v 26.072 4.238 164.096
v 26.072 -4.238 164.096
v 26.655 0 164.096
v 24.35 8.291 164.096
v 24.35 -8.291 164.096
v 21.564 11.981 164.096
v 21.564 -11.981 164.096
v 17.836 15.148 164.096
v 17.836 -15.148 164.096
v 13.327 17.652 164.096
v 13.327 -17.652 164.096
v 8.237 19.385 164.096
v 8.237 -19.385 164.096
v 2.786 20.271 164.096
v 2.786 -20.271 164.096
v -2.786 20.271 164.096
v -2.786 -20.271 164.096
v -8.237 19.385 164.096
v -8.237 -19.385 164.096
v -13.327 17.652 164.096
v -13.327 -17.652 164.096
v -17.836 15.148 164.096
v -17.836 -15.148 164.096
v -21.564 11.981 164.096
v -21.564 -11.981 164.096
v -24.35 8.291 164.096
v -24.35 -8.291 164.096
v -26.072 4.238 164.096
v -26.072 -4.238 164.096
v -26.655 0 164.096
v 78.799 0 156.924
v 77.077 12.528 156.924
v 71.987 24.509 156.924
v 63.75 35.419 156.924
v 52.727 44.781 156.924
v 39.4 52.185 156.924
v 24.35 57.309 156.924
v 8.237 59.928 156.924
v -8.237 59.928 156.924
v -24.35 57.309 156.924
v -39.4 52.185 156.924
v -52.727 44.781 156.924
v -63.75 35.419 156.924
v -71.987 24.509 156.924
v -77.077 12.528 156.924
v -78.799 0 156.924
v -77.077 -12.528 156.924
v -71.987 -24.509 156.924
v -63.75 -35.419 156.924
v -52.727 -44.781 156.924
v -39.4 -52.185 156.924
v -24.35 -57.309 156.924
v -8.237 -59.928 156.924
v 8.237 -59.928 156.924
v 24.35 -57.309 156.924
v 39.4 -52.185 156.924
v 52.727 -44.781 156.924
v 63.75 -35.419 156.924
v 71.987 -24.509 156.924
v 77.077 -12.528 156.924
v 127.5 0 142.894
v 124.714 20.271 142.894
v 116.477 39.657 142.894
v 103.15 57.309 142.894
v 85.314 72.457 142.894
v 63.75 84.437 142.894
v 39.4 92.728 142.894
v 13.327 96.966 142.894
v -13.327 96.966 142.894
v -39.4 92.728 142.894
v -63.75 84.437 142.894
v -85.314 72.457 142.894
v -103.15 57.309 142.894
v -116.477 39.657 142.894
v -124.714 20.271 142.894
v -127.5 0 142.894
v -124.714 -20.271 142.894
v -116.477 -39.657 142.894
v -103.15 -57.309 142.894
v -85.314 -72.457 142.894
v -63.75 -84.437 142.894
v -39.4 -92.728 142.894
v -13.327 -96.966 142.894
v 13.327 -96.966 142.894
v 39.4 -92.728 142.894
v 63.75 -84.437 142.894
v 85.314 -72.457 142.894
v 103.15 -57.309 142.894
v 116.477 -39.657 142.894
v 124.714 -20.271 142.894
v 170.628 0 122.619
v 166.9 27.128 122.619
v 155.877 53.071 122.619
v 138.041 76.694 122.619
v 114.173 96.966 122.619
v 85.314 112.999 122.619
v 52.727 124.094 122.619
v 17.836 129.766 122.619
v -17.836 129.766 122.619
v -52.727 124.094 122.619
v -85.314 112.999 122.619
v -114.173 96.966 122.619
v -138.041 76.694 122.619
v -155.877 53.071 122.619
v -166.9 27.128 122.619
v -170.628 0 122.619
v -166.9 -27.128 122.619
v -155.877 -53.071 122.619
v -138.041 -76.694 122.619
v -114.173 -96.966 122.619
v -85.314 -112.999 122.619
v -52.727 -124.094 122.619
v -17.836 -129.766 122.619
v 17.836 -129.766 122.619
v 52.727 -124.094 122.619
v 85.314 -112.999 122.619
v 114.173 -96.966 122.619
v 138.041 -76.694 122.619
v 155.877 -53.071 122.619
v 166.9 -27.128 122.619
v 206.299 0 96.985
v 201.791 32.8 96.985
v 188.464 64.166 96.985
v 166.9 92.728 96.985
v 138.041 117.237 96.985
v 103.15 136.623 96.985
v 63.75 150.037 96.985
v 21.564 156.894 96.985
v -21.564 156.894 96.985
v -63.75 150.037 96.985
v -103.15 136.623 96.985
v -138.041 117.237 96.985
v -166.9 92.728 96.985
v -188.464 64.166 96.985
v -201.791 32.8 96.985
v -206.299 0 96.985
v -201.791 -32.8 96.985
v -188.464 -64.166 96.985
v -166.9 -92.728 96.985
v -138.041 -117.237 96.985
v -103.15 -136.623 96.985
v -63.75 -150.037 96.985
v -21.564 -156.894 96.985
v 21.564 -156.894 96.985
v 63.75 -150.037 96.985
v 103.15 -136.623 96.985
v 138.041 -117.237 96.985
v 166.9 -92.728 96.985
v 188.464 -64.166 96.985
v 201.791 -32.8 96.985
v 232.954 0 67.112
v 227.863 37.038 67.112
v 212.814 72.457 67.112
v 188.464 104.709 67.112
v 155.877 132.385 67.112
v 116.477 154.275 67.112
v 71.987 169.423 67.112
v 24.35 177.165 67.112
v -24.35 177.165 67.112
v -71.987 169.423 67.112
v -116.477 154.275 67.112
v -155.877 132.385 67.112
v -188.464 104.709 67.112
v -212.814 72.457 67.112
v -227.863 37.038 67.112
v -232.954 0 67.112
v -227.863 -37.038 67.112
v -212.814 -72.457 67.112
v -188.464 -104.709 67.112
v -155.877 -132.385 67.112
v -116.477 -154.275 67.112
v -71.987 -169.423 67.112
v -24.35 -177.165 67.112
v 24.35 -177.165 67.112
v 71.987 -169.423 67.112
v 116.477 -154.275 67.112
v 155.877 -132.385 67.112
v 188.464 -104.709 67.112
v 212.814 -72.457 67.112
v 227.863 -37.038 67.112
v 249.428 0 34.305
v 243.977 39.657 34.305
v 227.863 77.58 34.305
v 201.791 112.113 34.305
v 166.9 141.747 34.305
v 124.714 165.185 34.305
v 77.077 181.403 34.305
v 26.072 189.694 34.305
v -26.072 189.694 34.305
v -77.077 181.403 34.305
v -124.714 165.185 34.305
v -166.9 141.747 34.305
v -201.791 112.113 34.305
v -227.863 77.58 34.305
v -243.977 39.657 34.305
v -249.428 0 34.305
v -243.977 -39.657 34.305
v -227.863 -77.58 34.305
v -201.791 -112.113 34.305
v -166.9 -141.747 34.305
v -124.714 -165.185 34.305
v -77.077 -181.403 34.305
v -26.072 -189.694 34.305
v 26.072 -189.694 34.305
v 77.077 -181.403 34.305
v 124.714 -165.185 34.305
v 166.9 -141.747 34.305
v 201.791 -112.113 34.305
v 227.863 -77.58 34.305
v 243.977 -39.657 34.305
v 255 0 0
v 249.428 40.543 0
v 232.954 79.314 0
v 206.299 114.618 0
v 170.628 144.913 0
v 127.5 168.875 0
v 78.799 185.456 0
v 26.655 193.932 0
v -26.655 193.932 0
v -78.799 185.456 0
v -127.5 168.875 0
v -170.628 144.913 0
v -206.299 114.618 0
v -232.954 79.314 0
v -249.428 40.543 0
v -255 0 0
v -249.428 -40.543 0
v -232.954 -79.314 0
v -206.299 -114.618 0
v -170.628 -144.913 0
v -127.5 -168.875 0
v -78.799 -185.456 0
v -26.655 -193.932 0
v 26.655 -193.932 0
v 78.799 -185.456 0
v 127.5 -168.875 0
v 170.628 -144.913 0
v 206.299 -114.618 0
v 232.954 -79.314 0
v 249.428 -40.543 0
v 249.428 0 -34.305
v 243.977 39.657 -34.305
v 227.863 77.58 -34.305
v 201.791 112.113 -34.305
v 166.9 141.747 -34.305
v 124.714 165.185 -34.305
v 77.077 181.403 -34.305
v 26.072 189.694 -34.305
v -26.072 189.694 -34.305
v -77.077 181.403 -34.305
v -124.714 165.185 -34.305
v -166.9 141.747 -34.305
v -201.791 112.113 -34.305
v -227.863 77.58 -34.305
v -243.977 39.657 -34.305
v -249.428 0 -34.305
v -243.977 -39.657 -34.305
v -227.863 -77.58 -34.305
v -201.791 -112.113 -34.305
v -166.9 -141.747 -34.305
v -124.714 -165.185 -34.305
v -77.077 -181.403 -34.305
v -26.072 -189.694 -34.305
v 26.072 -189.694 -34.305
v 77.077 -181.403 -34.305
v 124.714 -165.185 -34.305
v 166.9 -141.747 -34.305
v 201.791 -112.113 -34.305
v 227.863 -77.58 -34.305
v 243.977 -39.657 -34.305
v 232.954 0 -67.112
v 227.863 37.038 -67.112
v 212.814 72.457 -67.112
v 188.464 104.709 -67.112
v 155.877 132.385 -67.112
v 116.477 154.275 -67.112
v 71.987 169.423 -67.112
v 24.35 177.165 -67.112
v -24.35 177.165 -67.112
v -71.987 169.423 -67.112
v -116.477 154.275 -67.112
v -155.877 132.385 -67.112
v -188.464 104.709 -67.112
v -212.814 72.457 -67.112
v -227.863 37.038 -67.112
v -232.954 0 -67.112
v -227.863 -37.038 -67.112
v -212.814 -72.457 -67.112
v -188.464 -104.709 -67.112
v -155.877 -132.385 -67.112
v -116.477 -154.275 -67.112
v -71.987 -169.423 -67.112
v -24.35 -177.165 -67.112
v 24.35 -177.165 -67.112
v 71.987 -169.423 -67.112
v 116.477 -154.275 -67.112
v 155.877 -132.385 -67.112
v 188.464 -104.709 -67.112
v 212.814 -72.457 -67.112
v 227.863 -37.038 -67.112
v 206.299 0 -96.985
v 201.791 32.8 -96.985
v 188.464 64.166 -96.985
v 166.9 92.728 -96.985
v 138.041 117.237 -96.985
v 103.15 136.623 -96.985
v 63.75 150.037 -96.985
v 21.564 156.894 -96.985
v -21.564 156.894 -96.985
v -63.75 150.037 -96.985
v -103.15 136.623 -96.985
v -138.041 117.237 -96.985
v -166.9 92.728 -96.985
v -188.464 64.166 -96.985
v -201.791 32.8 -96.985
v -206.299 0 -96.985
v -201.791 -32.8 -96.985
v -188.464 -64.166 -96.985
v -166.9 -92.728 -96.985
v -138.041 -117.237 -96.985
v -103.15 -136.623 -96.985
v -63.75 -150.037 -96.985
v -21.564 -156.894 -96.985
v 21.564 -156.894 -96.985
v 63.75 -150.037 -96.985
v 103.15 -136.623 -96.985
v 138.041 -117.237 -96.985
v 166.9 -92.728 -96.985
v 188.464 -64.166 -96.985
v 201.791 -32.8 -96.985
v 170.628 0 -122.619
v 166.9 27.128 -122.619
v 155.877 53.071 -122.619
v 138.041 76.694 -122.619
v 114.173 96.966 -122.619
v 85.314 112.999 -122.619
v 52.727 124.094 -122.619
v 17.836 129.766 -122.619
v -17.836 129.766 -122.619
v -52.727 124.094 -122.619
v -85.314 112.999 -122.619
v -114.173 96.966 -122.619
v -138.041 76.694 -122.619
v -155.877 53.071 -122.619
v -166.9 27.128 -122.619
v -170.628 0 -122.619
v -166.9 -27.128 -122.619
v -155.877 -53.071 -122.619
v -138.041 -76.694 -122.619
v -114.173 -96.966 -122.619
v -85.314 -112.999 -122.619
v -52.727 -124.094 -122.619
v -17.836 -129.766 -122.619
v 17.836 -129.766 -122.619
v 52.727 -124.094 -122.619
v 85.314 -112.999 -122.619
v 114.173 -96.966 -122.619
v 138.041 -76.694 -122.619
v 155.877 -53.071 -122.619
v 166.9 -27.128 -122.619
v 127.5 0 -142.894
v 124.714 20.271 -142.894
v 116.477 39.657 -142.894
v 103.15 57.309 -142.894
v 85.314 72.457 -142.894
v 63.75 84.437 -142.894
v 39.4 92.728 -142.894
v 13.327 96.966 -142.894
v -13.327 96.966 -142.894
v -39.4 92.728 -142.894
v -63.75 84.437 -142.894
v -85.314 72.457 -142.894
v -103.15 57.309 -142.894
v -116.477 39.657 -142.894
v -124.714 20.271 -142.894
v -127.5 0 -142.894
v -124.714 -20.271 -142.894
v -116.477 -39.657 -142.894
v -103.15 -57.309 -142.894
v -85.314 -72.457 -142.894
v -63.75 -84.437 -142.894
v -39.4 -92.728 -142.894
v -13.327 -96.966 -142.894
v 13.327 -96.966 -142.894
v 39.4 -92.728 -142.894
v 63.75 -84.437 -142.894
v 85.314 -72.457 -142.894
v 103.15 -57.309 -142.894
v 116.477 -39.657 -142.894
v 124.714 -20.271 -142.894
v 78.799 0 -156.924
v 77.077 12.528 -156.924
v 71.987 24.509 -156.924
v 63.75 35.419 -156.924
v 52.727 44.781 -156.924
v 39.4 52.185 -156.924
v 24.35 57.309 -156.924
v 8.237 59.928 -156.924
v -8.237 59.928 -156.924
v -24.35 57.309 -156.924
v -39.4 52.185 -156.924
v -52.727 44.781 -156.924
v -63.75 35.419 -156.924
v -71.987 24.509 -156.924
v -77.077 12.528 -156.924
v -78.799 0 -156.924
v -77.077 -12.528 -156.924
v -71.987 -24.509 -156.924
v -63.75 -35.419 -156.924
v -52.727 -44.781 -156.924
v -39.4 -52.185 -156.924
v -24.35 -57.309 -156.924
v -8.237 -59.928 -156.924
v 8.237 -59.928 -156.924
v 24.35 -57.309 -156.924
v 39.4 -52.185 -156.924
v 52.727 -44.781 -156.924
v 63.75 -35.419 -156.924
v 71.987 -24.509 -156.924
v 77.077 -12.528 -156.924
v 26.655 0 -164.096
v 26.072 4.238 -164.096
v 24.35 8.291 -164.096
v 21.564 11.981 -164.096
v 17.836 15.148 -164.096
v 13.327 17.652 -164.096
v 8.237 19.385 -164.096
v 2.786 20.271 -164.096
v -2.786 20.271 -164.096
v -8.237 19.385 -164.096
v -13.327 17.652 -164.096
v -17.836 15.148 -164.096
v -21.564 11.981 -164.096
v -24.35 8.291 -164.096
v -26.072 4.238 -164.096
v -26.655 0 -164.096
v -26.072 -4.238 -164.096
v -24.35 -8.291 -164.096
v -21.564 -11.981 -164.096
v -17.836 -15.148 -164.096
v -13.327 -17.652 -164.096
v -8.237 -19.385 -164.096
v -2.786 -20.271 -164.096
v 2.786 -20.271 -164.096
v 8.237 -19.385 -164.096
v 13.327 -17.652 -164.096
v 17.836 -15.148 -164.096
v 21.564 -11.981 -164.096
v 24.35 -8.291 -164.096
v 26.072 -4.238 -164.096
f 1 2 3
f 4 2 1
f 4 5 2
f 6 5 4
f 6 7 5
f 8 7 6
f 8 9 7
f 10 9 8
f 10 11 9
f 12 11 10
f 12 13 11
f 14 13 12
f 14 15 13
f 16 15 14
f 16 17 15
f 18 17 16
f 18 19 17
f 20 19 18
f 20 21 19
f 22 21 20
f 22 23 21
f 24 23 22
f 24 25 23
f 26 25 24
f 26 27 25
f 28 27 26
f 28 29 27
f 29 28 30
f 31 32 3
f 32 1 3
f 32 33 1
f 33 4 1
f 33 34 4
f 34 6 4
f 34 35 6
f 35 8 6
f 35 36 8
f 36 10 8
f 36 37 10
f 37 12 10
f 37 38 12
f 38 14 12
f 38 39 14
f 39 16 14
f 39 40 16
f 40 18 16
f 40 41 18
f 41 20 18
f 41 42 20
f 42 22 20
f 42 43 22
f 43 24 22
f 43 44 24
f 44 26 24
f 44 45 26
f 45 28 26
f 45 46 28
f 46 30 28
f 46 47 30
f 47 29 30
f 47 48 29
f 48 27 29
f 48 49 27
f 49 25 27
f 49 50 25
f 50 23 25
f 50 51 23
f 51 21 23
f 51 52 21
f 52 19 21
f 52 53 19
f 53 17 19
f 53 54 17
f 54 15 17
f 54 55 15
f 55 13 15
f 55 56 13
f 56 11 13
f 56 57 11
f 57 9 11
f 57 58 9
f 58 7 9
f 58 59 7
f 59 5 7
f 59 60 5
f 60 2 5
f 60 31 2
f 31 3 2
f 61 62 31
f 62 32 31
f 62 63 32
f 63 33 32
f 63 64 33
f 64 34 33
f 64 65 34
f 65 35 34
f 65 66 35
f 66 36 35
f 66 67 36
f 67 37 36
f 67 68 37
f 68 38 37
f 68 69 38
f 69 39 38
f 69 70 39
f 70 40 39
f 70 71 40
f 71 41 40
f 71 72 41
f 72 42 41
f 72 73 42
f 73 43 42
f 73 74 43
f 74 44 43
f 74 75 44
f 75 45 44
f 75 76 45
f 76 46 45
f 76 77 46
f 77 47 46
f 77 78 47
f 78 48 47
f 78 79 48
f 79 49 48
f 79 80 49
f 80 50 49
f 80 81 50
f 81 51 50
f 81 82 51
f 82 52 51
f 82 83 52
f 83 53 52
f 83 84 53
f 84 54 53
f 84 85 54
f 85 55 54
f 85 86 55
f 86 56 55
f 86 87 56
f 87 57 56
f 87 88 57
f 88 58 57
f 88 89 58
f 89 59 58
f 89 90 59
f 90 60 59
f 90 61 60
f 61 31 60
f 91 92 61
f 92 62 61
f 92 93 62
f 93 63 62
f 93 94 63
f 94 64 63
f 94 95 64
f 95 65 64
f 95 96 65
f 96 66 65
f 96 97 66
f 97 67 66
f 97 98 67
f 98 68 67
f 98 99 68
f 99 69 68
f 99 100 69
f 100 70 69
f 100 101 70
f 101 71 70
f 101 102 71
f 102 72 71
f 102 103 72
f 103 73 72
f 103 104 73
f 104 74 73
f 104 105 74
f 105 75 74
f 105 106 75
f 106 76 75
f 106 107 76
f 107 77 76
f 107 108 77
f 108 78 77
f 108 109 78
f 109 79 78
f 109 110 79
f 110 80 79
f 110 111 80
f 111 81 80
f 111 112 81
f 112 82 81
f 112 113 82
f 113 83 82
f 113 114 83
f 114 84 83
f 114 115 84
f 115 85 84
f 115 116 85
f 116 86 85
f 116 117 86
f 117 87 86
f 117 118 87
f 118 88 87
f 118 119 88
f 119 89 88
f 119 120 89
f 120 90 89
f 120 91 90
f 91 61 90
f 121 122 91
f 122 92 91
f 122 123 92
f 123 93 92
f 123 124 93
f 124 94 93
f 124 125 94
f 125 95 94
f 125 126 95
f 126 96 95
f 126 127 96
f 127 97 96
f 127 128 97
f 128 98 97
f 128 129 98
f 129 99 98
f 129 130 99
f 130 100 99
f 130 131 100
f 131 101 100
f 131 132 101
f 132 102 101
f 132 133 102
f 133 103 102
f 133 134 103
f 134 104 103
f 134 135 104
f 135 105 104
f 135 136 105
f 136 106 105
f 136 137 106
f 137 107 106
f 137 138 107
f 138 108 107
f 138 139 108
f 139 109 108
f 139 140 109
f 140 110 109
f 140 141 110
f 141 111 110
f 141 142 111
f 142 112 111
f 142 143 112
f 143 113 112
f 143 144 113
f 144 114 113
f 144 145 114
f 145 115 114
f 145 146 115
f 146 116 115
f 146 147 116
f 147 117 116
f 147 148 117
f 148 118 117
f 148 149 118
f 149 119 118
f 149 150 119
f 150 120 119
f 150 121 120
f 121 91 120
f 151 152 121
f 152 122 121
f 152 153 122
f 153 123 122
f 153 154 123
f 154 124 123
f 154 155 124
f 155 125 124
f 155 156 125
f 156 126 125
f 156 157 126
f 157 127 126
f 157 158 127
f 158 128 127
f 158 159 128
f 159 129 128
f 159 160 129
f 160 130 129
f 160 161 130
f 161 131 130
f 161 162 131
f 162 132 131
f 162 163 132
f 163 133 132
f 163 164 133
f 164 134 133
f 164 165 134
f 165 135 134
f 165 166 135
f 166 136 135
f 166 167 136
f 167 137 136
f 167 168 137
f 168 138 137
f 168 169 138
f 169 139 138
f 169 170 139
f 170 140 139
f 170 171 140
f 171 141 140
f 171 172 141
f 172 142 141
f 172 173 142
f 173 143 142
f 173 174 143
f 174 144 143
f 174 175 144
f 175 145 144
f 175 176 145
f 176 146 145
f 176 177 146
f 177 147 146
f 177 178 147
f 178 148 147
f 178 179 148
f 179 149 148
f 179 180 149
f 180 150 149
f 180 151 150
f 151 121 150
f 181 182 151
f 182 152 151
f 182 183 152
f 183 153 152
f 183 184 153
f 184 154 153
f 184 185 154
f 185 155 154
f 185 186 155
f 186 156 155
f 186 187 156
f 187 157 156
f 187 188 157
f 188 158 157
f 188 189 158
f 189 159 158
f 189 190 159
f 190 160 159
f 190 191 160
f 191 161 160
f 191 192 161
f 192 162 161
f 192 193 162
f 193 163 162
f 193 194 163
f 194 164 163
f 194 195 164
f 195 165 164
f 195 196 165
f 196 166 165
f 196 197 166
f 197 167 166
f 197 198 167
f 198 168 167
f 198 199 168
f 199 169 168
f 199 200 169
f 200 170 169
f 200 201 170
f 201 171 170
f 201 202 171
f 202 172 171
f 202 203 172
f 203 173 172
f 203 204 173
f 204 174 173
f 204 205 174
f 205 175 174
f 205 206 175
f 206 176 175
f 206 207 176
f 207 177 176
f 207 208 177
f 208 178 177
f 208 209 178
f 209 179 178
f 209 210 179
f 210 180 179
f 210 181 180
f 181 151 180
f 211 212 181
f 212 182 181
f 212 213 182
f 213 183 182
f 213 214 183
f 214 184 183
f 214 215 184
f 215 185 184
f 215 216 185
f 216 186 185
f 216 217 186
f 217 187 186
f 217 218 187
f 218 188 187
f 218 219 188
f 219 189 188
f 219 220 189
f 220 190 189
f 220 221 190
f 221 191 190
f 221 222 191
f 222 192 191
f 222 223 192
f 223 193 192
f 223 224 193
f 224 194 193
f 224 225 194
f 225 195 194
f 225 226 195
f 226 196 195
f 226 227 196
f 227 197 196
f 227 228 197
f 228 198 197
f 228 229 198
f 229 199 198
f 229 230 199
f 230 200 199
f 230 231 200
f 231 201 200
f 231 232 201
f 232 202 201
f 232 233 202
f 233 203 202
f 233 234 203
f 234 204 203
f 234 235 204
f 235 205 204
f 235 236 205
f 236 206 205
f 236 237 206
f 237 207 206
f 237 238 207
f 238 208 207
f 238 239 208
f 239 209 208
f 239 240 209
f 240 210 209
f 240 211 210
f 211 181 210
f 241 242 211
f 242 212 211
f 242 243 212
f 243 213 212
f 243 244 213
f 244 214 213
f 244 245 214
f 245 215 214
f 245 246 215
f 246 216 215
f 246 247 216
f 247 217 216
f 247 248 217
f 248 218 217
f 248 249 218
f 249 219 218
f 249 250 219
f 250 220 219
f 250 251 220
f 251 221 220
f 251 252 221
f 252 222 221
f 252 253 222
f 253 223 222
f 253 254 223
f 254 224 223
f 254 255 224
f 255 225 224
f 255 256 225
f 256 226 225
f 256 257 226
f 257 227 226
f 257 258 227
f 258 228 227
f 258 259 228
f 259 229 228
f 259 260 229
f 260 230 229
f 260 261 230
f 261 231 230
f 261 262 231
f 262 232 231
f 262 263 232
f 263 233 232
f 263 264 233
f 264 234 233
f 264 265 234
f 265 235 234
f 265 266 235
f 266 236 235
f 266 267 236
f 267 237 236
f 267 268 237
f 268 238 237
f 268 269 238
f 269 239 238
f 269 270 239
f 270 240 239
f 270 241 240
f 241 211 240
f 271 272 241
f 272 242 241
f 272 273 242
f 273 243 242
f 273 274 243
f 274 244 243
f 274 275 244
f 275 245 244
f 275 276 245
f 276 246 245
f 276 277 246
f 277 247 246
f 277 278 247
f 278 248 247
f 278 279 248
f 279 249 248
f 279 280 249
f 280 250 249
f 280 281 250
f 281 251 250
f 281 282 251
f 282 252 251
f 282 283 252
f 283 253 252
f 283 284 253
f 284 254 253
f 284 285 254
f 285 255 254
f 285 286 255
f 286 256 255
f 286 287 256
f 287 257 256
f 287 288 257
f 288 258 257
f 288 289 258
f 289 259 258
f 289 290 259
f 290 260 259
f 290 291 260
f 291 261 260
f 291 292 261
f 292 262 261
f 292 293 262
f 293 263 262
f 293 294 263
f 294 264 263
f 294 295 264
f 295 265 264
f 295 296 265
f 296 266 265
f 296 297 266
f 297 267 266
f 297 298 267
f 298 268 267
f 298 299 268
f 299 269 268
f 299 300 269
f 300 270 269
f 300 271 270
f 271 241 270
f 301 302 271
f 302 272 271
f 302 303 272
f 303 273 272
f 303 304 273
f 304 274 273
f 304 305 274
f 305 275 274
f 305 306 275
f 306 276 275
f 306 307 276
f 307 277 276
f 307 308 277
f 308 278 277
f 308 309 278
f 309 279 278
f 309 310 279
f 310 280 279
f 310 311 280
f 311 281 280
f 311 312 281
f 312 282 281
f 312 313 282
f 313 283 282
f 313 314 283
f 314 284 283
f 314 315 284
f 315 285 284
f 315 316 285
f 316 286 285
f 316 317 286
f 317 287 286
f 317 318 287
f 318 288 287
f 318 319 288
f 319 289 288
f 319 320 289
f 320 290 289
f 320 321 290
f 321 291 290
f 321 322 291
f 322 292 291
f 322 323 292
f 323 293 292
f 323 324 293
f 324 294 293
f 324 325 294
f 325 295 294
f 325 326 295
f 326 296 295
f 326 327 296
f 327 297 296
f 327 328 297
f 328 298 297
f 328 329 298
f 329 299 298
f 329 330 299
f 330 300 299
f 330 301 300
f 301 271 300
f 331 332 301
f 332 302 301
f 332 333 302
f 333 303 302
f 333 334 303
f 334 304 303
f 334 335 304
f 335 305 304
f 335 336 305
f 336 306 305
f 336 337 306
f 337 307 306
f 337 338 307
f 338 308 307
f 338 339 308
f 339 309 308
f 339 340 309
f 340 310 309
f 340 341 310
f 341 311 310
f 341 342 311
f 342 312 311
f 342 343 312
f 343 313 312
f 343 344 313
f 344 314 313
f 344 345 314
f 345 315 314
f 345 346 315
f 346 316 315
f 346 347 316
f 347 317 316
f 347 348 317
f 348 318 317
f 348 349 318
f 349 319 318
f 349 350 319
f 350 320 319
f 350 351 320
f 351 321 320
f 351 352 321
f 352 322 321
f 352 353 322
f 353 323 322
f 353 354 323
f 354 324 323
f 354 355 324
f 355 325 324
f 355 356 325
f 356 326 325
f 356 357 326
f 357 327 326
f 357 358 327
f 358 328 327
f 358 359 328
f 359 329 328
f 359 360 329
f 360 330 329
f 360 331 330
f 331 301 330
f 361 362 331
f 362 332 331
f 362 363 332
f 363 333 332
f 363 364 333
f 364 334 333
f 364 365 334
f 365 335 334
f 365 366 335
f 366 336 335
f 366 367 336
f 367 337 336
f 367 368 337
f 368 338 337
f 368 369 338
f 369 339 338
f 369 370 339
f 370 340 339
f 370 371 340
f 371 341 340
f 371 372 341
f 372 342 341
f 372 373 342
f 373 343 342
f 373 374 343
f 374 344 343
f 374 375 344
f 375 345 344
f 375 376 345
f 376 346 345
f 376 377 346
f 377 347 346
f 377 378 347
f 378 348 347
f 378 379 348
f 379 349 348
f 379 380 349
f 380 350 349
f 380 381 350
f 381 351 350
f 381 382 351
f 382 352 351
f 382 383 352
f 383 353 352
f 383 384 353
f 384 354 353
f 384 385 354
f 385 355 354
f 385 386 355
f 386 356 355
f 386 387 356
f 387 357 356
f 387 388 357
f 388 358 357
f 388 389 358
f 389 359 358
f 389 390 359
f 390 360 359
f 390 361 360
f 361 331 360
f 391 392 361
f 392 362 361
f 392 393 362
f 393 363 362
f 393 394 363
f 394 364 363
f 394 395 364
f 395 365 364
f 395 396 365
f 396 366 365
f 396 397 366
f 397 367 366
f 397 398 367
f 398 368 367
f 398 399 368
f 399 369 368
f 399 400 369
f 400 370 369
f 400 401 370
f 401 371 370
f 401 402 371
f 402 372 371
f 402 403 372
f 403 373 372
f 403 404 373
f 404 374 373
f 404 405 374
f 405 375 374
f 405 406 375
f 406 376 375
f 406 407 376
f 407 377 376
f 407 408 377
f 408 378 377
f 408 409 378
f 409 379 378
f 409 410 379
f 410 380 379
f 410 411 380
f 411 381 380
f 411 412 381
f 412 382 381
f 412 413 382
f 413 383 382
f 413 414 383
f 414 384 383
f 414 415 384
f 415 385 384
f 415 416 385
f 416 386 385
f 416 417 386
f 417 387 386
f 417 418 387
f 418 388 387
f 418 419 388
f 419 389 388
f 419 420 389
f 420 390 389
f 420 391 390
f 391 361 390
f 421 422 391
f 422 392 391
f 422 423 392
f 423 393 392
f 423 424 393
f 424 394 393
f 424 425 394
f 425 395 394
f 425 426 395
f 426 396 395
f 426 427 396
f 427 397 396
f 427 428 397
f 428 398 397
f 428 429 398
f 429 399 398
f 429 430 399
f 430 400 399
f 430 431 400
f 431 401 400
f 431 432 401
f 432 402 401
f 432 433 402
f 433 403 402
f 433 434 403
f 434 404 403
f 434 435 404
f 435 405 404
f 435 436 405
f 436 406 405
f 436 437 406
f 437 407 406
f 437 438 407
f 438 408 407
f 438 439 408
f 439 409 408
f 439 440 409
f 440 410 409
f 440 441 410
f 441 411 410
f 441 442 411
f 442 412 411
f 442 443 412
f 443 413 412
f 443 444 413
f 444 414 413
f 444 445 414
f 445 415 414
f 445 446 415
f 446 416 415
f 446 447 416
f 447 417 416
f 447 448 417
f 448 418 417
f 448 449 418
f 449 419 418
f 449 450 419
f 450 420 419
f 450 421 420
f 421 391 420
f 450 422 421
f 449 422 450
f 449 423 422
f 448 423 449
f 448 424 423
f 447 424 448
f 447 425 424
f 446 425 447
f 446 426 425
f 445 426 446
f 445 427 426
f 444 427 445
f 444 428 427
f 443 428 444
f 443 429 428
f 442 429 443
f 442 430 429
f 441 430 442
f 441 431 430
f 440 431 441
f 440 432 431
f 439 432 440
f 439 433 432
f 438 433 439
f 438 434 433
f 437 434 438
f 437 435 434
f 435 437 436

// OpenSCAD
// Generated by SolidPython 1.0.1 on 2020-07-29 00:46:53


scale(v = [17, 13, 11]) {
	sphere(r = 15);
}
/***********************************************
*********      SolidPython code:      **********
************************************************
 
# import packages: SolidPython
from solid import *
from solid.utils import *
from itertools import chain, combinations, permutations


class Resize:

    def __init__(self, scad_file):
        self.scad_file = scad_file
        #self.scad_file = import_scad(scad_file)
        # cone/cylinder param:
        self.r1 = 0
        self.r2 = 0
        self.h = 0
        # rectangular prism param:
        self.w = 0
        self.l = 0
        # ellipse param:
        self.r = 0

    # import OpenScad code (file name corresponds to shape)


    # classify shape + parameters
    def assign(self, param1, param2, param3):
        if self.scad_file == 'cone.scad':
            self.r1 = param1
            self.r2 = param2
            self.h = param3
        elif self.scad_file == 'cylinder.scad':
            self.r1 = param1
            self.r2 = param2
            self.h = param3
        elif self.scad_file == 'rectangularPrism.scad':
            self.h = param1
            self.l = param2
            self.w = param3
        else:
            self.r = param1
            self.h = param2

    # resize parameters
    def iterate(self):
        x = range(3, 20, 2)
        i = 1
        if self.scad_file == 'cone.scad':
            tempList = list(permutations(x, 2))
            for temp in tempList:
                param1 = temp[0]
                param2 = temp[1]
                filepath = 'produced_scad_files/' + 'cone' + str(param1) + '_' + str(param2) + '_' + '.scad'
                scad_render_to_file(cylinder(h=param1, r1=param2, r2=0), filepath)

        elif self.scad_file == 'cylinder.scad':
            tempList = list(permutations(x, 3))
            for temp in tempList:
                param1 = temp[0]
                param2 = temp[1]
                filepath = 'produced_scad_files/' + 'cylinder' + str(param1) + '_' + str(param2) + '_' + '.scad'
                scad_render_to_file(cylinder(h=param1, r1=param2, r2=param2), filepath)

        elif self.scad_file == 'rectangularPrism.scad':
            tempList = list(permutations(x, 3))
            for temp in tempList:
                param1 = temp[0]
                param2 = temp[1]
                param3 = temp[2]
                filepath = 'produced_scad_files/' + 'rectangularPrism' + str(param1) + '_' + str(param2) + '_' + str(
                    param3) + '.scad'
                scad_render_to_file(cube(size=(param1, param2, param3)), filepath)

        elif self.scad_file == 'ellipse.scad':
            tempList = list(permutations(x, 4))
            for temp in tempList:
                param1 = temp[0]
                param2 = temp[1]
                param3 = temp[2]
                param4 = temp[3]
                filepath = 'produced_scad_files/' + 'ellipse' + str(param1) + '_' + str(param2) + '_' + str(param3) + '_' + str(param4) + '.scad'
                scad_render_to_file(scale([param1, param2, param3])(sphere(r=param4)), filepath)

    def render_to_scadfile(self):
        scad_render_to_file(scad, 'example.scad') 
 
************************************************/
